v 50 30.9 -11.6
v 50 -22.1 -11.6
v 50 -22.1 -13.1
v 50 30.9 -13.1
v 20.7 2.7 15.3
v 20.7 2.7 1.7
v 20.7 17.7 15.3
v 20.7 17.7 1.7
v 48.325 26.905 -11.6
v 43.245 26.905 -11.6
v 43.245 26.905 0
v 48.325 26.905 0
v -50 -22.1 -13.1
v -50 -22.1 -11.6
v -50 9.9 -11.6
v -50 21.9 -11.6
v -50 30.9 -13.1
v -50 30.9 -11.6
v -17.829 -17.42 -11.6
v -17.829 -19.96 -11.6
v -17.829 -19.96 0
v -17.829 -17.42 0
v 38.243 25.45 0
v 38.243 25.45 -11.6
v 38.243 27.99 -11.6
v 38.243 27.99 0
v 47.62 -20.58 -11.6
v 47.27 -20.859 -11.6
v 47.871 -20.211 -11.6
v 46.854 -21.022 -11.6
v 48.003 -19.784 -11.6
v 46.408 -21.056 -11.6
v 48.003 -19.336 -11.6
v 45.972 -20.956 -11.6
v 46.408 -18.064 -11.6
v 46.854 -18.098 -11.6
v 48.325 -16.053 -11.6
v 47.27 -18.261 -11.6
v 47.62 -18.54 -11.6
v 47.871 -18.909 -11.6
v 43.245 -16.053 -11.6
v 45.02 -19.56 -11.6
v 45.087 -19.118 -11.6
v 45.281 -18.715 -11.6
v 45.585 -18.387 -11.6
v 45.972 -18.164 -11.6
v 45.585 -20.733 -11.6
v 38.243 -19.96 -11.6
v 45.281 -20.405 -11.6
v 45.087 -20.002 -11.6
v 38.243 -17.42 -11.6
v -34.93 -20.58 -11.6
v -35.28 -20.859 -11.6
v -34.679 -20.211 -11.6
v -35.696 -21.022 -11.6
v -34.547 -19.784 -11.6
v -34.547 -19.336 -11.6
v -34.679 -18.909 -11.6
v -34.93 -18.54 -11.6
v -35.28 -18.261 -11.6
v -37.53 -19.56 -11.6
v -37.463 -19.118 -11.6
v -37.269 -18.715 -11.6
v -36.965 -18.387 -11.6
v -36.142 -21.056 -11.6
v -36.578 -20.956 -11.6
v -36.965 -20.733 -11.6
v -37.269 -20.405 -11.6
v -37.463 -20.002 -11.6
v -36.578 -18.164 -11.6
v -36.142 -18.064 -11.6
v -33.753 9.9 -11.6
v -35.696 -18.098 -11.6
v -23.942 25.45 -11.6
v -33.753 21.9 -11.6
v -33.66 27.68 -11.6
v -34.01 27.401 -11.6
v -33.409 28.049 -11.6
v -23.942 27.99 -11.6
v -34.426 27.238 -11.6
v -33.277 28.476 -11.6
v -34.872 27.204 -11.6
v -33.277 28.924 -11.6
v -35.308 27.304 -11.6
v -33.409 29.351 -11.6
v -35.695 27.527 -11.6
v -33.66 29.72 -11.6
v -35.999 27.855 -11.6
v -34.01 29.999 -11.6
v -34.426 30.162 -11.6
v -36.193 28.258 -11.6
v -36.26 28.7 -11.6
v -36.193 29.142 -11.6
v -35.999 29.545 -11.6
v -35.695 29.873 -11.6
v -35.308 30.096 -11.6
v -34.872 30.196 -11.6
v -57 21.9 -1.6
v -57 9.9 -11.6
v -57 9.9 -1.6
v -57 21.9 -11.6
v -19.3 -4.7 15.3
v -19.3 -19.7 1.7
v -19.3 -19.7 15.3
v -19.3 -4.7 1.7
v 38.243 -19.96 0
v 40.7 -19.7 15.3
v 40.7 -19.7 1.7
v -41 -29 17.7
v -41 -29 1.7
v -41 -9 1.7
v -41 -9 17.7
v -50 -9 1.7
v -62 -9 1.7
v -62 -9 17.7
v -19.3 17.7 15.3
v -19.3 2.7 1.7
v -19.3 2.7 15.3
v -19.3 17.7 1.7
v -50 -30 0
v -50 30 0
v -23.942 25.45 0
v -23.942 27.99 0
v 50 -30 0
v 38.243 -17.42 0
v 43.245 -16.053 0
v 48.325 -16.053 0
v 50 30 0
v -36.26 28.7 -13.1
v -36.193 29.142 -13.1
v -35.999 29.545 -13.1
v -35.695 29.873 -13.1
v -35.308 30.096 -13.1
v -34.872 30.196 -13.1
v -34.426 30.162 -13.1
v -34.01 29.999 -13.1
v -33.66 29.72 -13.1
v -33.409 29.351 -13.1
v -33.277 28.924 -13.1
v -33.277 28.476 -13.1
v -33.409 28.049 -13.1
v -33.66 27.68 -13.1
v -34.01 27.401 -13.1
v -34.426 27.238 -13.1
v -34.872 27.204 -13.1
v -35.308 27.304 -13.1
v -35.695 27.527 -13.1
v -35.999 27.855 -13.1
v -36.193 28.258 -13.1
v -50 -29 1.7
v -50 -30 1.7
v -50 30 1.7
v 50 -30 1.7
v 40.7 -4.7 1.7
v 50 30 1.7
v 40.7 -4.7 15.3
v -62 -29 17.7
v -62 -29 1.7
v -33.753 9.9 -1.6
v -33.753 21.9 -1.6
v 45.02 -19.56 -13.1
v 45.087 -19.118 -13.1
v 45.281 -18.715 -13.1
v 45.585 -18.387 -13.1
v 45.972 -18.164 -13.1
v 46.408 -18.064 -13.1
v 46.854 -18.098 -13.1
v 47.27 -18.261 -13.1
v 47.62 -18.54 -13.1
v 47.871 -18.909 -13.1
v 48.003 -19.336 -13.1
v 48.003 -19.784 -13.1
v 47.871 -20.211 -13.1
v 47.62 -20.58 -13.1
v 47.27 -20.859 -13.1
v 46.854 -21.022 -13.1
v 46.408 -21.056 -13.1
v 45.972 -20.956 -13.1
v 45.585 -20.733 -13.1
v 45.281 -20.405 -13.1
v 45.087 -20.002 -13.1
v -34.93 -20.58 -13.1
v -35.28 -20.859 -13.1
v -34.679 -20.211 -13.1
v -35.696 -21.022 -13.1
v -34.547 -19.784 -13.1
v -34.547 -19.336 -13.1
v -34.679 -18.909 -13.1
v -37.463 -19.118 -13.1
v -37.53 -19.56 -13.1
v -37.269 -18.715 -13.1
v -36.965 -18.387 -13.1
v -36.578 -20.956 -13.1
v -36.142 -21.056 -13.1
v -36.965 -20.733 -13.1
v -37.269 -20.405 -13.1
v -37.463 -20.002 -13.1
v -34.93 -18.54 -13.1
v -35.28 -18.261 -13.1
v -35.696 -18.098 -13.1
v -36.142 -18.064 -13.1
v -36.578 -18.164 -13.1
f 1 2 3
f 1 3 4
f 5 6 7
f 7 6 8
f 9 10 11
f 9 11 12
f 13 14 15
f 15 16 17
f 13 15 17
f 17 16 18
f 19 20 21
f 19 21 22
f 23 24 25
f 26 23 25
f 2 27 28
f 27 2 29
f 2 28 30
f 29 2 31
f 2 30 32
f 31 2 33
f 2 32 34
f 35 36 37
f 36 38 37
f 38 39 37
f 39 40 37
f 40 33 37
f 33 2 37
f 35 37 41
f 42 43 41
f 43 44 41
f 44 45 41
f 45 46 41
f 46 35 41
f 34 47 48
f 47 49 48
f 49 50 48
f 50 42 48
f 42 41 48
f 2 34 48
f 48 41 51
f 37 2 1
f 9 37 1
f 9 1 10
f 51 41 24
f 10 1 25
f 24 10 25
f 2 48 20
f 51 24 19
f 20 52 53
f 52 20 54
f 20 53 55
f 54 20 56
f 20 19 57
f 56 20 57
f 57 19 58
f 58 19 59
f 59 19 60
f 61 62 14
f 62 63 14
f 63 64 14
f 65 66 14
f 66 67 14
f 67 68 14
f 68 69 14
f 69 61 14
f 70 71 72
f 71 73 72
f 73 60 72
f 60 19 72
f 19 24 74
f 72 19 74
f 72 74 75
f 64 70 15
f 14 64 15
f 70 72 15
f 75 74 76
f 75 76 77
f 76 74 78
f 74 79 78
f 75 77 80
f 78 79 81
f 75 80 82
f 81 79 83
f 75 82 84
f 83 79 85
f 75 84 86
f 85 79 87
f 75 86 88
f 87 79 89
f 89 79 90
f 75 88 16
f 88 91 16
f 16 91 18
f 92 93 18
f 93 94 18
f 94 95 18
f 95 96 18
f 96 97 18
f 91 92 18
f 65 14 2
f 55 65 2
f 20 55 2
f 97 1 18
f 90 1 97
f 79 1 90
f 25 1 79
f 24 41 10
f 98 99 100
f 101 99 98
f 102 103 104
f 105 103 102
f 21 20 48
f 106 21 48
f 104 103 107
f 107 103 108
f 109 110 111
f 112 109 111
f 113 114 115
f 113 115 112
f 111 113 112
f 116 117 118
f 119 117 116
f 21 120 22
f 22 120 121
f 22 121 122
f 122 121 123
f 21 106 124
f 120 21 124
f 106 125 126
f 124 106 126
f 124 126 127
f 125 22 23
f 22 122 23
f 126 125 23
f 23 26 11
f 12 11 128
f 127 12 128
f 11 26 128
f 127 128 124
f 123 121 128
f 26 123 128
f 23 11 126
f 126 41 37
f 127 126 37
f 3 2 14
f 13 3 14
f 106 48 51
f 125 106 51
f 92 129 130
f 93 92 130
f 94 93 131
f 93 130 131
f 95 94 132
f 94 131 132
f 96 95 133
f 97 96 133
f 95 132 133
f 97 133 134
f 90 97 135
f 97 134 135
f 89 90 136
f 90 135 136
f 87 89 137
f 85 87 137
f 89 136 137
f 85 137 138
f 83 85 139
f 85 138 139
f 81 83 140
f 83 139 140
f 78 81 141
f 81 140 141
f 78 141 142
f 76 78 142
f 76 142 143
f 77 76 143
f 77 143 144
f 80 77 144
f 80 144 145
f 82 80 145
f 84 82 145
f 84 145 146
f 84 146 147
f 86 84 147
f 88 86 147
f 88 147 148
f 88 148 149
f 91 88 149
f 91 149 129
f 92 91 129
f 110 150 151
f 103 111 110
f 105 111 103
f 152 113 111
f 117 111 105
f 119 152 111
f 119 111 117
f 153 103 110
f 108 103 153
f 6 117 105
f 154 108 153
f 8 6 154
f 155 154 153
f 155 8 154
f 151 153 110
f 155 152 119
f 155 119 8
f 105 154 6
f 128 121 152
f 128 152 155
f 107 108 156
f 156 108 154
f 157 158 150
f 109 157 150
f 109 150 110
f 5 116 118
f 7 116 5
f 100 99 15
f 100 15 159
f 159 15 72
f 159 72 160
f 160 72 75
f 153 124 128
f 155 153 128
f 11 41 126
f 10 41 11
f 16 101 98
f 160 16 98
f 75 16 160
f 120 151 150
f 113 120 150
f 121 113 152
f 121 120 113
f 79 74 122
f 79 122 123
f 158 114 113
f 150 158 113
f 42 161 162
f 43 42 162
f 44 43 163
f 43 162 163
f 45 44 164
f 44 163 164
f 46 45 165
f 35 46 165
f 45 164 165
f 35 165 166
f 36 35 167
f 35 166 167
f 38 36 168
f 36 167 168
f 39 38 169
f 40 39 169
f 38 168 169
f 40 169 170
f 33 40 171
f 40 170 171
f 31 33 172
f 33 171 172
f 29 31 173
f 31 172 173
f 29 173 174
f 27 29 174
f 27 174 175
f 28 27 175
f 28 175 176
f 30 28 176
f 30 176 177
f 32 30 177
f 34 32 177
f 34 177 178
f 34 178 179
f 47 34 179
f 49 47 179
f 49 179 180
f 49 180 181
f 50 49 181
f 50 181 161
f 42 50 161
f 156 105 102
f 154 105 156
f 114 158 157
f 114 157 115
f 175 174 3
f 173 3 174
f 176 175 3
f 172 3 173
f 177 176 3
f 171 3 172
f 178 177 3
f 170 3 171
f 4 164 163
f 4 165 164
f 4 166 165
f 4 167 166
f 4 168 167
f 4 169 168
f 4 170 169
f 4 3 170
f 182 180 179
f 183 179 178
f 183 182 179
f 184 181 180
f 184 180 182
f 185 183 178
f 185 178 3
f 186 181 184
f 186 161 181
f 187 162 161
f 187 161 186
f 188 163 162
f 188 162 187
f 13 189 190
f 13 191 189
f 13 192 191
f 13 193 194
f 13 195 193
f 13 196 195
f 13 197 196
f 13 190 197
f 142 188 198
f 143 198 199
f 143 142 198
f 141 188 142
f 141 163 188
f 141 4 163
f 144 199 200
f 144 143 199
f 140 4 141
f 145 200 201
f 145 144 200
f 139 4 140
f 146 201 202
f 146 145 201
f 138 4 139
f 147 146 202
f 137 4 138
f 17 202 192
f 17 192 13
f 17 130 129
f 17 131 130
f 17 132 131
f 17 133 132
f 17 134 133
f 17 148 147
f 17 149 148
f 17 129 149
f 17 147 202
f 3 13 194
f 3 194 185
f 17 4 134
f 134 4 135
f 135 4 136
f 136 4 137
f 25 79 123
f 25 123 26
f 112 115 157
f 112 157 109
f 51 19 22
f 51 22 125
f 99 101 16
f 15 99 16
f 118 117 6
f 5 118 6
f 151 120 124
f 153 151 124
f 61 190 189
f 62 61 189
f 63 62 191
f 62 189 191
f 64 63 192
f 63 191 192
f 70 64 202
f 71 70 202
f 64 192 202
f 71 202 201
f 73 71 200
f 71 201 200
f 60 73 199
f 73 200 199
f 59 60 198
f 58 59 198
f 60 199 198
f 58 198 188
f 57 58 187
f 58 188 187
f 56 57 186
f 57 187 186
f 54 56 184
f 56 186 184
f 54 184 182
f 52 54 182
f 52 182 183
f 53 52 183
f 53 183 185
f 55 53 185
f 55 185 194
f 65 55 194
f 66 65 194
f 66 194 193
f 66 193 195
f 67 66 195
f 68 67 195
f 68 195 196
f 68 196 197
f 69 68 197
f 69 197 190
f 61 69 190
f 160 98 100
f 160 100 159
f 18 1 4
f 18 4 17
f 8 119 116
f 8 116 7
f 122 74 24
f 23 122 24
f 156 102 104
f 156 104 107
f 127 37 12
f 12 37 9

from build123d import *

# Parameters (mm, degrees)
ESBO_O1_W                 = 100
ESBO_O1_H                 = 60
RESSALTO_EXTRUS_O1_DEPTH  = 1.7
ESBO_O2_W                 = 60
ESBO_O2_H                 = 15
ESBO_O2_W_2               = 40
RESSALTO_EXTRUS_O2_DEPTH  = 13.6
RESSALTO_EXTRUS_O6_START  = 11.6
ESBO_O3_W                 = 100
ESBO_O3_H                 = 53
RESSALTO_EXTRUS_O6_DEPTH  = 1.5
ESBO_O4_W                 = 62.184169383
ESBO_O4_H                 = 2.54
ESBO_O4_W_2               = 5.08
ESBO_O4_H_2               = 42.957805244
ESBO_O4_W_3               = 56.07185462
RESSALTO_EXTRUS_O8_DEPTH  = 11.6
ESBO_O6_W                 = 21
ESBO_O6_H                 = 20
RESSALTO_EXTRUS_O9_DEPTH  = 16
ESBO_O7_W                 = 23.246964405
ESBO_O7_H                 = 12
RESSALTO_EXTRUS_O10_DEPTH = 10
ESBO_O8_R                 = 1.5
CORTE_EXTRUS_O1_DEPTH     = 10


with BuildPart() as part:
    # Esboço1 → Ressalto-extrusão1 (new body)
    with BuildSketch(Plane.XY):
        Rectangle(ESBO_O1_W, ESBO_O1_H)
    extrude(amount=RESSALTO_EXTRUS_O1_DEPTH)

    # Esboço2 → Ressalto-extrusão2 (add)
    with BuildSketch(Plane.XY.offset(1.7)):
        with Locations((10.7, -12.2)):
            Rectangle(ESBO_O2_W, ESBO_O2_H)
        with Locations((0.7, 10.2)):
            Rectangle(ESBO_O2_W_2, ESBO_O2_H)
    extrude(amount=RESSALTO_EXTRUS_O2_DEPTH)



with BuildPart() as body_2:
    # Esboço3 → Ressalto-extrusão6 (new body)
    with BuildSketch(Plane(origin=(0, 0, 0), x_dir=(-1, 0, 0), z_dir=(0, 0, -1)).offset(RESSALTO_EXTRUS_O6_START)):
        with Locations((0, 4.4)):
            Rectangle(ESBO_O3_W, ESBO_O3_H)
    extrude(amount=RESSALTO_EXTRUS_O6_DEPTH)


with BuildPart() as part_1:
    add(part.part)

    add(body_2.part)  # Ressalto-extrusão8 merges body 2
    # Esboço4 → Ressalto-extrusão8 (add)
    with BuildSketch(Plane.XY.offset(-11.6)):
        with Locations((7.150543675, 26.719832293)):
            Rectangle(ESBO_O4_W, ESBO_O4_H)
        with Locations((45.784919315, 5.42627648)):
            Rectangle(ESBO_O4_W_2, ESBO_O4_H_2)
        with Locations((10.206701056, -18.689881399)):
            Rectangle(ESBO_O4_W_3, ESBO_O4_H)
    extrude(amount=RESSALTO_EXTRUS_O8_DEPTH)

    # Esboço6 → Ressalto-extrusão9 (add)
    with BuildSketch(Plane.XY.offset(1.7)):
        with Locations((-51.5, -19)):
            Rectangle(ESBO_O6_W, ESBO_O6_H)
    extrude(amount=RESSALTO_EXTRUS_O9_DEPTH)

    # Esboço7 → Ressalto-extrusão10 (add)
    with BuildSketch(Plane.XY.offset(-11.6)):
        with Locations((-45.376517798, 15.9)):
            Rectangle(ESBO_O7_W, ESBO_O7_H)
    extrude(amount=RESSALTO_EXTRUS_O10_DEPTH)

    # Esboço8 → Corte-extrusão1 (cut)
    with BuildSketch(Plane(origin=(0, 0, -13.1), x_dir=(-1, 0, 0), z_dir=(0, 0, -1))):
        with Locations((34.76, 28.7)):
            Circle(ESBO_O8_R)
        with Locations((36.03, -19.56)):
            Circle(ESBO_O8_R)
        with Locations((-46.52, -19.56)):
            Circle(ESBO_O8_R)
    extrude(amount=-CORTE_EXTRUS_O1_DEPTH, mode=Mode.SUBTRACT)


solid = part_1.part
